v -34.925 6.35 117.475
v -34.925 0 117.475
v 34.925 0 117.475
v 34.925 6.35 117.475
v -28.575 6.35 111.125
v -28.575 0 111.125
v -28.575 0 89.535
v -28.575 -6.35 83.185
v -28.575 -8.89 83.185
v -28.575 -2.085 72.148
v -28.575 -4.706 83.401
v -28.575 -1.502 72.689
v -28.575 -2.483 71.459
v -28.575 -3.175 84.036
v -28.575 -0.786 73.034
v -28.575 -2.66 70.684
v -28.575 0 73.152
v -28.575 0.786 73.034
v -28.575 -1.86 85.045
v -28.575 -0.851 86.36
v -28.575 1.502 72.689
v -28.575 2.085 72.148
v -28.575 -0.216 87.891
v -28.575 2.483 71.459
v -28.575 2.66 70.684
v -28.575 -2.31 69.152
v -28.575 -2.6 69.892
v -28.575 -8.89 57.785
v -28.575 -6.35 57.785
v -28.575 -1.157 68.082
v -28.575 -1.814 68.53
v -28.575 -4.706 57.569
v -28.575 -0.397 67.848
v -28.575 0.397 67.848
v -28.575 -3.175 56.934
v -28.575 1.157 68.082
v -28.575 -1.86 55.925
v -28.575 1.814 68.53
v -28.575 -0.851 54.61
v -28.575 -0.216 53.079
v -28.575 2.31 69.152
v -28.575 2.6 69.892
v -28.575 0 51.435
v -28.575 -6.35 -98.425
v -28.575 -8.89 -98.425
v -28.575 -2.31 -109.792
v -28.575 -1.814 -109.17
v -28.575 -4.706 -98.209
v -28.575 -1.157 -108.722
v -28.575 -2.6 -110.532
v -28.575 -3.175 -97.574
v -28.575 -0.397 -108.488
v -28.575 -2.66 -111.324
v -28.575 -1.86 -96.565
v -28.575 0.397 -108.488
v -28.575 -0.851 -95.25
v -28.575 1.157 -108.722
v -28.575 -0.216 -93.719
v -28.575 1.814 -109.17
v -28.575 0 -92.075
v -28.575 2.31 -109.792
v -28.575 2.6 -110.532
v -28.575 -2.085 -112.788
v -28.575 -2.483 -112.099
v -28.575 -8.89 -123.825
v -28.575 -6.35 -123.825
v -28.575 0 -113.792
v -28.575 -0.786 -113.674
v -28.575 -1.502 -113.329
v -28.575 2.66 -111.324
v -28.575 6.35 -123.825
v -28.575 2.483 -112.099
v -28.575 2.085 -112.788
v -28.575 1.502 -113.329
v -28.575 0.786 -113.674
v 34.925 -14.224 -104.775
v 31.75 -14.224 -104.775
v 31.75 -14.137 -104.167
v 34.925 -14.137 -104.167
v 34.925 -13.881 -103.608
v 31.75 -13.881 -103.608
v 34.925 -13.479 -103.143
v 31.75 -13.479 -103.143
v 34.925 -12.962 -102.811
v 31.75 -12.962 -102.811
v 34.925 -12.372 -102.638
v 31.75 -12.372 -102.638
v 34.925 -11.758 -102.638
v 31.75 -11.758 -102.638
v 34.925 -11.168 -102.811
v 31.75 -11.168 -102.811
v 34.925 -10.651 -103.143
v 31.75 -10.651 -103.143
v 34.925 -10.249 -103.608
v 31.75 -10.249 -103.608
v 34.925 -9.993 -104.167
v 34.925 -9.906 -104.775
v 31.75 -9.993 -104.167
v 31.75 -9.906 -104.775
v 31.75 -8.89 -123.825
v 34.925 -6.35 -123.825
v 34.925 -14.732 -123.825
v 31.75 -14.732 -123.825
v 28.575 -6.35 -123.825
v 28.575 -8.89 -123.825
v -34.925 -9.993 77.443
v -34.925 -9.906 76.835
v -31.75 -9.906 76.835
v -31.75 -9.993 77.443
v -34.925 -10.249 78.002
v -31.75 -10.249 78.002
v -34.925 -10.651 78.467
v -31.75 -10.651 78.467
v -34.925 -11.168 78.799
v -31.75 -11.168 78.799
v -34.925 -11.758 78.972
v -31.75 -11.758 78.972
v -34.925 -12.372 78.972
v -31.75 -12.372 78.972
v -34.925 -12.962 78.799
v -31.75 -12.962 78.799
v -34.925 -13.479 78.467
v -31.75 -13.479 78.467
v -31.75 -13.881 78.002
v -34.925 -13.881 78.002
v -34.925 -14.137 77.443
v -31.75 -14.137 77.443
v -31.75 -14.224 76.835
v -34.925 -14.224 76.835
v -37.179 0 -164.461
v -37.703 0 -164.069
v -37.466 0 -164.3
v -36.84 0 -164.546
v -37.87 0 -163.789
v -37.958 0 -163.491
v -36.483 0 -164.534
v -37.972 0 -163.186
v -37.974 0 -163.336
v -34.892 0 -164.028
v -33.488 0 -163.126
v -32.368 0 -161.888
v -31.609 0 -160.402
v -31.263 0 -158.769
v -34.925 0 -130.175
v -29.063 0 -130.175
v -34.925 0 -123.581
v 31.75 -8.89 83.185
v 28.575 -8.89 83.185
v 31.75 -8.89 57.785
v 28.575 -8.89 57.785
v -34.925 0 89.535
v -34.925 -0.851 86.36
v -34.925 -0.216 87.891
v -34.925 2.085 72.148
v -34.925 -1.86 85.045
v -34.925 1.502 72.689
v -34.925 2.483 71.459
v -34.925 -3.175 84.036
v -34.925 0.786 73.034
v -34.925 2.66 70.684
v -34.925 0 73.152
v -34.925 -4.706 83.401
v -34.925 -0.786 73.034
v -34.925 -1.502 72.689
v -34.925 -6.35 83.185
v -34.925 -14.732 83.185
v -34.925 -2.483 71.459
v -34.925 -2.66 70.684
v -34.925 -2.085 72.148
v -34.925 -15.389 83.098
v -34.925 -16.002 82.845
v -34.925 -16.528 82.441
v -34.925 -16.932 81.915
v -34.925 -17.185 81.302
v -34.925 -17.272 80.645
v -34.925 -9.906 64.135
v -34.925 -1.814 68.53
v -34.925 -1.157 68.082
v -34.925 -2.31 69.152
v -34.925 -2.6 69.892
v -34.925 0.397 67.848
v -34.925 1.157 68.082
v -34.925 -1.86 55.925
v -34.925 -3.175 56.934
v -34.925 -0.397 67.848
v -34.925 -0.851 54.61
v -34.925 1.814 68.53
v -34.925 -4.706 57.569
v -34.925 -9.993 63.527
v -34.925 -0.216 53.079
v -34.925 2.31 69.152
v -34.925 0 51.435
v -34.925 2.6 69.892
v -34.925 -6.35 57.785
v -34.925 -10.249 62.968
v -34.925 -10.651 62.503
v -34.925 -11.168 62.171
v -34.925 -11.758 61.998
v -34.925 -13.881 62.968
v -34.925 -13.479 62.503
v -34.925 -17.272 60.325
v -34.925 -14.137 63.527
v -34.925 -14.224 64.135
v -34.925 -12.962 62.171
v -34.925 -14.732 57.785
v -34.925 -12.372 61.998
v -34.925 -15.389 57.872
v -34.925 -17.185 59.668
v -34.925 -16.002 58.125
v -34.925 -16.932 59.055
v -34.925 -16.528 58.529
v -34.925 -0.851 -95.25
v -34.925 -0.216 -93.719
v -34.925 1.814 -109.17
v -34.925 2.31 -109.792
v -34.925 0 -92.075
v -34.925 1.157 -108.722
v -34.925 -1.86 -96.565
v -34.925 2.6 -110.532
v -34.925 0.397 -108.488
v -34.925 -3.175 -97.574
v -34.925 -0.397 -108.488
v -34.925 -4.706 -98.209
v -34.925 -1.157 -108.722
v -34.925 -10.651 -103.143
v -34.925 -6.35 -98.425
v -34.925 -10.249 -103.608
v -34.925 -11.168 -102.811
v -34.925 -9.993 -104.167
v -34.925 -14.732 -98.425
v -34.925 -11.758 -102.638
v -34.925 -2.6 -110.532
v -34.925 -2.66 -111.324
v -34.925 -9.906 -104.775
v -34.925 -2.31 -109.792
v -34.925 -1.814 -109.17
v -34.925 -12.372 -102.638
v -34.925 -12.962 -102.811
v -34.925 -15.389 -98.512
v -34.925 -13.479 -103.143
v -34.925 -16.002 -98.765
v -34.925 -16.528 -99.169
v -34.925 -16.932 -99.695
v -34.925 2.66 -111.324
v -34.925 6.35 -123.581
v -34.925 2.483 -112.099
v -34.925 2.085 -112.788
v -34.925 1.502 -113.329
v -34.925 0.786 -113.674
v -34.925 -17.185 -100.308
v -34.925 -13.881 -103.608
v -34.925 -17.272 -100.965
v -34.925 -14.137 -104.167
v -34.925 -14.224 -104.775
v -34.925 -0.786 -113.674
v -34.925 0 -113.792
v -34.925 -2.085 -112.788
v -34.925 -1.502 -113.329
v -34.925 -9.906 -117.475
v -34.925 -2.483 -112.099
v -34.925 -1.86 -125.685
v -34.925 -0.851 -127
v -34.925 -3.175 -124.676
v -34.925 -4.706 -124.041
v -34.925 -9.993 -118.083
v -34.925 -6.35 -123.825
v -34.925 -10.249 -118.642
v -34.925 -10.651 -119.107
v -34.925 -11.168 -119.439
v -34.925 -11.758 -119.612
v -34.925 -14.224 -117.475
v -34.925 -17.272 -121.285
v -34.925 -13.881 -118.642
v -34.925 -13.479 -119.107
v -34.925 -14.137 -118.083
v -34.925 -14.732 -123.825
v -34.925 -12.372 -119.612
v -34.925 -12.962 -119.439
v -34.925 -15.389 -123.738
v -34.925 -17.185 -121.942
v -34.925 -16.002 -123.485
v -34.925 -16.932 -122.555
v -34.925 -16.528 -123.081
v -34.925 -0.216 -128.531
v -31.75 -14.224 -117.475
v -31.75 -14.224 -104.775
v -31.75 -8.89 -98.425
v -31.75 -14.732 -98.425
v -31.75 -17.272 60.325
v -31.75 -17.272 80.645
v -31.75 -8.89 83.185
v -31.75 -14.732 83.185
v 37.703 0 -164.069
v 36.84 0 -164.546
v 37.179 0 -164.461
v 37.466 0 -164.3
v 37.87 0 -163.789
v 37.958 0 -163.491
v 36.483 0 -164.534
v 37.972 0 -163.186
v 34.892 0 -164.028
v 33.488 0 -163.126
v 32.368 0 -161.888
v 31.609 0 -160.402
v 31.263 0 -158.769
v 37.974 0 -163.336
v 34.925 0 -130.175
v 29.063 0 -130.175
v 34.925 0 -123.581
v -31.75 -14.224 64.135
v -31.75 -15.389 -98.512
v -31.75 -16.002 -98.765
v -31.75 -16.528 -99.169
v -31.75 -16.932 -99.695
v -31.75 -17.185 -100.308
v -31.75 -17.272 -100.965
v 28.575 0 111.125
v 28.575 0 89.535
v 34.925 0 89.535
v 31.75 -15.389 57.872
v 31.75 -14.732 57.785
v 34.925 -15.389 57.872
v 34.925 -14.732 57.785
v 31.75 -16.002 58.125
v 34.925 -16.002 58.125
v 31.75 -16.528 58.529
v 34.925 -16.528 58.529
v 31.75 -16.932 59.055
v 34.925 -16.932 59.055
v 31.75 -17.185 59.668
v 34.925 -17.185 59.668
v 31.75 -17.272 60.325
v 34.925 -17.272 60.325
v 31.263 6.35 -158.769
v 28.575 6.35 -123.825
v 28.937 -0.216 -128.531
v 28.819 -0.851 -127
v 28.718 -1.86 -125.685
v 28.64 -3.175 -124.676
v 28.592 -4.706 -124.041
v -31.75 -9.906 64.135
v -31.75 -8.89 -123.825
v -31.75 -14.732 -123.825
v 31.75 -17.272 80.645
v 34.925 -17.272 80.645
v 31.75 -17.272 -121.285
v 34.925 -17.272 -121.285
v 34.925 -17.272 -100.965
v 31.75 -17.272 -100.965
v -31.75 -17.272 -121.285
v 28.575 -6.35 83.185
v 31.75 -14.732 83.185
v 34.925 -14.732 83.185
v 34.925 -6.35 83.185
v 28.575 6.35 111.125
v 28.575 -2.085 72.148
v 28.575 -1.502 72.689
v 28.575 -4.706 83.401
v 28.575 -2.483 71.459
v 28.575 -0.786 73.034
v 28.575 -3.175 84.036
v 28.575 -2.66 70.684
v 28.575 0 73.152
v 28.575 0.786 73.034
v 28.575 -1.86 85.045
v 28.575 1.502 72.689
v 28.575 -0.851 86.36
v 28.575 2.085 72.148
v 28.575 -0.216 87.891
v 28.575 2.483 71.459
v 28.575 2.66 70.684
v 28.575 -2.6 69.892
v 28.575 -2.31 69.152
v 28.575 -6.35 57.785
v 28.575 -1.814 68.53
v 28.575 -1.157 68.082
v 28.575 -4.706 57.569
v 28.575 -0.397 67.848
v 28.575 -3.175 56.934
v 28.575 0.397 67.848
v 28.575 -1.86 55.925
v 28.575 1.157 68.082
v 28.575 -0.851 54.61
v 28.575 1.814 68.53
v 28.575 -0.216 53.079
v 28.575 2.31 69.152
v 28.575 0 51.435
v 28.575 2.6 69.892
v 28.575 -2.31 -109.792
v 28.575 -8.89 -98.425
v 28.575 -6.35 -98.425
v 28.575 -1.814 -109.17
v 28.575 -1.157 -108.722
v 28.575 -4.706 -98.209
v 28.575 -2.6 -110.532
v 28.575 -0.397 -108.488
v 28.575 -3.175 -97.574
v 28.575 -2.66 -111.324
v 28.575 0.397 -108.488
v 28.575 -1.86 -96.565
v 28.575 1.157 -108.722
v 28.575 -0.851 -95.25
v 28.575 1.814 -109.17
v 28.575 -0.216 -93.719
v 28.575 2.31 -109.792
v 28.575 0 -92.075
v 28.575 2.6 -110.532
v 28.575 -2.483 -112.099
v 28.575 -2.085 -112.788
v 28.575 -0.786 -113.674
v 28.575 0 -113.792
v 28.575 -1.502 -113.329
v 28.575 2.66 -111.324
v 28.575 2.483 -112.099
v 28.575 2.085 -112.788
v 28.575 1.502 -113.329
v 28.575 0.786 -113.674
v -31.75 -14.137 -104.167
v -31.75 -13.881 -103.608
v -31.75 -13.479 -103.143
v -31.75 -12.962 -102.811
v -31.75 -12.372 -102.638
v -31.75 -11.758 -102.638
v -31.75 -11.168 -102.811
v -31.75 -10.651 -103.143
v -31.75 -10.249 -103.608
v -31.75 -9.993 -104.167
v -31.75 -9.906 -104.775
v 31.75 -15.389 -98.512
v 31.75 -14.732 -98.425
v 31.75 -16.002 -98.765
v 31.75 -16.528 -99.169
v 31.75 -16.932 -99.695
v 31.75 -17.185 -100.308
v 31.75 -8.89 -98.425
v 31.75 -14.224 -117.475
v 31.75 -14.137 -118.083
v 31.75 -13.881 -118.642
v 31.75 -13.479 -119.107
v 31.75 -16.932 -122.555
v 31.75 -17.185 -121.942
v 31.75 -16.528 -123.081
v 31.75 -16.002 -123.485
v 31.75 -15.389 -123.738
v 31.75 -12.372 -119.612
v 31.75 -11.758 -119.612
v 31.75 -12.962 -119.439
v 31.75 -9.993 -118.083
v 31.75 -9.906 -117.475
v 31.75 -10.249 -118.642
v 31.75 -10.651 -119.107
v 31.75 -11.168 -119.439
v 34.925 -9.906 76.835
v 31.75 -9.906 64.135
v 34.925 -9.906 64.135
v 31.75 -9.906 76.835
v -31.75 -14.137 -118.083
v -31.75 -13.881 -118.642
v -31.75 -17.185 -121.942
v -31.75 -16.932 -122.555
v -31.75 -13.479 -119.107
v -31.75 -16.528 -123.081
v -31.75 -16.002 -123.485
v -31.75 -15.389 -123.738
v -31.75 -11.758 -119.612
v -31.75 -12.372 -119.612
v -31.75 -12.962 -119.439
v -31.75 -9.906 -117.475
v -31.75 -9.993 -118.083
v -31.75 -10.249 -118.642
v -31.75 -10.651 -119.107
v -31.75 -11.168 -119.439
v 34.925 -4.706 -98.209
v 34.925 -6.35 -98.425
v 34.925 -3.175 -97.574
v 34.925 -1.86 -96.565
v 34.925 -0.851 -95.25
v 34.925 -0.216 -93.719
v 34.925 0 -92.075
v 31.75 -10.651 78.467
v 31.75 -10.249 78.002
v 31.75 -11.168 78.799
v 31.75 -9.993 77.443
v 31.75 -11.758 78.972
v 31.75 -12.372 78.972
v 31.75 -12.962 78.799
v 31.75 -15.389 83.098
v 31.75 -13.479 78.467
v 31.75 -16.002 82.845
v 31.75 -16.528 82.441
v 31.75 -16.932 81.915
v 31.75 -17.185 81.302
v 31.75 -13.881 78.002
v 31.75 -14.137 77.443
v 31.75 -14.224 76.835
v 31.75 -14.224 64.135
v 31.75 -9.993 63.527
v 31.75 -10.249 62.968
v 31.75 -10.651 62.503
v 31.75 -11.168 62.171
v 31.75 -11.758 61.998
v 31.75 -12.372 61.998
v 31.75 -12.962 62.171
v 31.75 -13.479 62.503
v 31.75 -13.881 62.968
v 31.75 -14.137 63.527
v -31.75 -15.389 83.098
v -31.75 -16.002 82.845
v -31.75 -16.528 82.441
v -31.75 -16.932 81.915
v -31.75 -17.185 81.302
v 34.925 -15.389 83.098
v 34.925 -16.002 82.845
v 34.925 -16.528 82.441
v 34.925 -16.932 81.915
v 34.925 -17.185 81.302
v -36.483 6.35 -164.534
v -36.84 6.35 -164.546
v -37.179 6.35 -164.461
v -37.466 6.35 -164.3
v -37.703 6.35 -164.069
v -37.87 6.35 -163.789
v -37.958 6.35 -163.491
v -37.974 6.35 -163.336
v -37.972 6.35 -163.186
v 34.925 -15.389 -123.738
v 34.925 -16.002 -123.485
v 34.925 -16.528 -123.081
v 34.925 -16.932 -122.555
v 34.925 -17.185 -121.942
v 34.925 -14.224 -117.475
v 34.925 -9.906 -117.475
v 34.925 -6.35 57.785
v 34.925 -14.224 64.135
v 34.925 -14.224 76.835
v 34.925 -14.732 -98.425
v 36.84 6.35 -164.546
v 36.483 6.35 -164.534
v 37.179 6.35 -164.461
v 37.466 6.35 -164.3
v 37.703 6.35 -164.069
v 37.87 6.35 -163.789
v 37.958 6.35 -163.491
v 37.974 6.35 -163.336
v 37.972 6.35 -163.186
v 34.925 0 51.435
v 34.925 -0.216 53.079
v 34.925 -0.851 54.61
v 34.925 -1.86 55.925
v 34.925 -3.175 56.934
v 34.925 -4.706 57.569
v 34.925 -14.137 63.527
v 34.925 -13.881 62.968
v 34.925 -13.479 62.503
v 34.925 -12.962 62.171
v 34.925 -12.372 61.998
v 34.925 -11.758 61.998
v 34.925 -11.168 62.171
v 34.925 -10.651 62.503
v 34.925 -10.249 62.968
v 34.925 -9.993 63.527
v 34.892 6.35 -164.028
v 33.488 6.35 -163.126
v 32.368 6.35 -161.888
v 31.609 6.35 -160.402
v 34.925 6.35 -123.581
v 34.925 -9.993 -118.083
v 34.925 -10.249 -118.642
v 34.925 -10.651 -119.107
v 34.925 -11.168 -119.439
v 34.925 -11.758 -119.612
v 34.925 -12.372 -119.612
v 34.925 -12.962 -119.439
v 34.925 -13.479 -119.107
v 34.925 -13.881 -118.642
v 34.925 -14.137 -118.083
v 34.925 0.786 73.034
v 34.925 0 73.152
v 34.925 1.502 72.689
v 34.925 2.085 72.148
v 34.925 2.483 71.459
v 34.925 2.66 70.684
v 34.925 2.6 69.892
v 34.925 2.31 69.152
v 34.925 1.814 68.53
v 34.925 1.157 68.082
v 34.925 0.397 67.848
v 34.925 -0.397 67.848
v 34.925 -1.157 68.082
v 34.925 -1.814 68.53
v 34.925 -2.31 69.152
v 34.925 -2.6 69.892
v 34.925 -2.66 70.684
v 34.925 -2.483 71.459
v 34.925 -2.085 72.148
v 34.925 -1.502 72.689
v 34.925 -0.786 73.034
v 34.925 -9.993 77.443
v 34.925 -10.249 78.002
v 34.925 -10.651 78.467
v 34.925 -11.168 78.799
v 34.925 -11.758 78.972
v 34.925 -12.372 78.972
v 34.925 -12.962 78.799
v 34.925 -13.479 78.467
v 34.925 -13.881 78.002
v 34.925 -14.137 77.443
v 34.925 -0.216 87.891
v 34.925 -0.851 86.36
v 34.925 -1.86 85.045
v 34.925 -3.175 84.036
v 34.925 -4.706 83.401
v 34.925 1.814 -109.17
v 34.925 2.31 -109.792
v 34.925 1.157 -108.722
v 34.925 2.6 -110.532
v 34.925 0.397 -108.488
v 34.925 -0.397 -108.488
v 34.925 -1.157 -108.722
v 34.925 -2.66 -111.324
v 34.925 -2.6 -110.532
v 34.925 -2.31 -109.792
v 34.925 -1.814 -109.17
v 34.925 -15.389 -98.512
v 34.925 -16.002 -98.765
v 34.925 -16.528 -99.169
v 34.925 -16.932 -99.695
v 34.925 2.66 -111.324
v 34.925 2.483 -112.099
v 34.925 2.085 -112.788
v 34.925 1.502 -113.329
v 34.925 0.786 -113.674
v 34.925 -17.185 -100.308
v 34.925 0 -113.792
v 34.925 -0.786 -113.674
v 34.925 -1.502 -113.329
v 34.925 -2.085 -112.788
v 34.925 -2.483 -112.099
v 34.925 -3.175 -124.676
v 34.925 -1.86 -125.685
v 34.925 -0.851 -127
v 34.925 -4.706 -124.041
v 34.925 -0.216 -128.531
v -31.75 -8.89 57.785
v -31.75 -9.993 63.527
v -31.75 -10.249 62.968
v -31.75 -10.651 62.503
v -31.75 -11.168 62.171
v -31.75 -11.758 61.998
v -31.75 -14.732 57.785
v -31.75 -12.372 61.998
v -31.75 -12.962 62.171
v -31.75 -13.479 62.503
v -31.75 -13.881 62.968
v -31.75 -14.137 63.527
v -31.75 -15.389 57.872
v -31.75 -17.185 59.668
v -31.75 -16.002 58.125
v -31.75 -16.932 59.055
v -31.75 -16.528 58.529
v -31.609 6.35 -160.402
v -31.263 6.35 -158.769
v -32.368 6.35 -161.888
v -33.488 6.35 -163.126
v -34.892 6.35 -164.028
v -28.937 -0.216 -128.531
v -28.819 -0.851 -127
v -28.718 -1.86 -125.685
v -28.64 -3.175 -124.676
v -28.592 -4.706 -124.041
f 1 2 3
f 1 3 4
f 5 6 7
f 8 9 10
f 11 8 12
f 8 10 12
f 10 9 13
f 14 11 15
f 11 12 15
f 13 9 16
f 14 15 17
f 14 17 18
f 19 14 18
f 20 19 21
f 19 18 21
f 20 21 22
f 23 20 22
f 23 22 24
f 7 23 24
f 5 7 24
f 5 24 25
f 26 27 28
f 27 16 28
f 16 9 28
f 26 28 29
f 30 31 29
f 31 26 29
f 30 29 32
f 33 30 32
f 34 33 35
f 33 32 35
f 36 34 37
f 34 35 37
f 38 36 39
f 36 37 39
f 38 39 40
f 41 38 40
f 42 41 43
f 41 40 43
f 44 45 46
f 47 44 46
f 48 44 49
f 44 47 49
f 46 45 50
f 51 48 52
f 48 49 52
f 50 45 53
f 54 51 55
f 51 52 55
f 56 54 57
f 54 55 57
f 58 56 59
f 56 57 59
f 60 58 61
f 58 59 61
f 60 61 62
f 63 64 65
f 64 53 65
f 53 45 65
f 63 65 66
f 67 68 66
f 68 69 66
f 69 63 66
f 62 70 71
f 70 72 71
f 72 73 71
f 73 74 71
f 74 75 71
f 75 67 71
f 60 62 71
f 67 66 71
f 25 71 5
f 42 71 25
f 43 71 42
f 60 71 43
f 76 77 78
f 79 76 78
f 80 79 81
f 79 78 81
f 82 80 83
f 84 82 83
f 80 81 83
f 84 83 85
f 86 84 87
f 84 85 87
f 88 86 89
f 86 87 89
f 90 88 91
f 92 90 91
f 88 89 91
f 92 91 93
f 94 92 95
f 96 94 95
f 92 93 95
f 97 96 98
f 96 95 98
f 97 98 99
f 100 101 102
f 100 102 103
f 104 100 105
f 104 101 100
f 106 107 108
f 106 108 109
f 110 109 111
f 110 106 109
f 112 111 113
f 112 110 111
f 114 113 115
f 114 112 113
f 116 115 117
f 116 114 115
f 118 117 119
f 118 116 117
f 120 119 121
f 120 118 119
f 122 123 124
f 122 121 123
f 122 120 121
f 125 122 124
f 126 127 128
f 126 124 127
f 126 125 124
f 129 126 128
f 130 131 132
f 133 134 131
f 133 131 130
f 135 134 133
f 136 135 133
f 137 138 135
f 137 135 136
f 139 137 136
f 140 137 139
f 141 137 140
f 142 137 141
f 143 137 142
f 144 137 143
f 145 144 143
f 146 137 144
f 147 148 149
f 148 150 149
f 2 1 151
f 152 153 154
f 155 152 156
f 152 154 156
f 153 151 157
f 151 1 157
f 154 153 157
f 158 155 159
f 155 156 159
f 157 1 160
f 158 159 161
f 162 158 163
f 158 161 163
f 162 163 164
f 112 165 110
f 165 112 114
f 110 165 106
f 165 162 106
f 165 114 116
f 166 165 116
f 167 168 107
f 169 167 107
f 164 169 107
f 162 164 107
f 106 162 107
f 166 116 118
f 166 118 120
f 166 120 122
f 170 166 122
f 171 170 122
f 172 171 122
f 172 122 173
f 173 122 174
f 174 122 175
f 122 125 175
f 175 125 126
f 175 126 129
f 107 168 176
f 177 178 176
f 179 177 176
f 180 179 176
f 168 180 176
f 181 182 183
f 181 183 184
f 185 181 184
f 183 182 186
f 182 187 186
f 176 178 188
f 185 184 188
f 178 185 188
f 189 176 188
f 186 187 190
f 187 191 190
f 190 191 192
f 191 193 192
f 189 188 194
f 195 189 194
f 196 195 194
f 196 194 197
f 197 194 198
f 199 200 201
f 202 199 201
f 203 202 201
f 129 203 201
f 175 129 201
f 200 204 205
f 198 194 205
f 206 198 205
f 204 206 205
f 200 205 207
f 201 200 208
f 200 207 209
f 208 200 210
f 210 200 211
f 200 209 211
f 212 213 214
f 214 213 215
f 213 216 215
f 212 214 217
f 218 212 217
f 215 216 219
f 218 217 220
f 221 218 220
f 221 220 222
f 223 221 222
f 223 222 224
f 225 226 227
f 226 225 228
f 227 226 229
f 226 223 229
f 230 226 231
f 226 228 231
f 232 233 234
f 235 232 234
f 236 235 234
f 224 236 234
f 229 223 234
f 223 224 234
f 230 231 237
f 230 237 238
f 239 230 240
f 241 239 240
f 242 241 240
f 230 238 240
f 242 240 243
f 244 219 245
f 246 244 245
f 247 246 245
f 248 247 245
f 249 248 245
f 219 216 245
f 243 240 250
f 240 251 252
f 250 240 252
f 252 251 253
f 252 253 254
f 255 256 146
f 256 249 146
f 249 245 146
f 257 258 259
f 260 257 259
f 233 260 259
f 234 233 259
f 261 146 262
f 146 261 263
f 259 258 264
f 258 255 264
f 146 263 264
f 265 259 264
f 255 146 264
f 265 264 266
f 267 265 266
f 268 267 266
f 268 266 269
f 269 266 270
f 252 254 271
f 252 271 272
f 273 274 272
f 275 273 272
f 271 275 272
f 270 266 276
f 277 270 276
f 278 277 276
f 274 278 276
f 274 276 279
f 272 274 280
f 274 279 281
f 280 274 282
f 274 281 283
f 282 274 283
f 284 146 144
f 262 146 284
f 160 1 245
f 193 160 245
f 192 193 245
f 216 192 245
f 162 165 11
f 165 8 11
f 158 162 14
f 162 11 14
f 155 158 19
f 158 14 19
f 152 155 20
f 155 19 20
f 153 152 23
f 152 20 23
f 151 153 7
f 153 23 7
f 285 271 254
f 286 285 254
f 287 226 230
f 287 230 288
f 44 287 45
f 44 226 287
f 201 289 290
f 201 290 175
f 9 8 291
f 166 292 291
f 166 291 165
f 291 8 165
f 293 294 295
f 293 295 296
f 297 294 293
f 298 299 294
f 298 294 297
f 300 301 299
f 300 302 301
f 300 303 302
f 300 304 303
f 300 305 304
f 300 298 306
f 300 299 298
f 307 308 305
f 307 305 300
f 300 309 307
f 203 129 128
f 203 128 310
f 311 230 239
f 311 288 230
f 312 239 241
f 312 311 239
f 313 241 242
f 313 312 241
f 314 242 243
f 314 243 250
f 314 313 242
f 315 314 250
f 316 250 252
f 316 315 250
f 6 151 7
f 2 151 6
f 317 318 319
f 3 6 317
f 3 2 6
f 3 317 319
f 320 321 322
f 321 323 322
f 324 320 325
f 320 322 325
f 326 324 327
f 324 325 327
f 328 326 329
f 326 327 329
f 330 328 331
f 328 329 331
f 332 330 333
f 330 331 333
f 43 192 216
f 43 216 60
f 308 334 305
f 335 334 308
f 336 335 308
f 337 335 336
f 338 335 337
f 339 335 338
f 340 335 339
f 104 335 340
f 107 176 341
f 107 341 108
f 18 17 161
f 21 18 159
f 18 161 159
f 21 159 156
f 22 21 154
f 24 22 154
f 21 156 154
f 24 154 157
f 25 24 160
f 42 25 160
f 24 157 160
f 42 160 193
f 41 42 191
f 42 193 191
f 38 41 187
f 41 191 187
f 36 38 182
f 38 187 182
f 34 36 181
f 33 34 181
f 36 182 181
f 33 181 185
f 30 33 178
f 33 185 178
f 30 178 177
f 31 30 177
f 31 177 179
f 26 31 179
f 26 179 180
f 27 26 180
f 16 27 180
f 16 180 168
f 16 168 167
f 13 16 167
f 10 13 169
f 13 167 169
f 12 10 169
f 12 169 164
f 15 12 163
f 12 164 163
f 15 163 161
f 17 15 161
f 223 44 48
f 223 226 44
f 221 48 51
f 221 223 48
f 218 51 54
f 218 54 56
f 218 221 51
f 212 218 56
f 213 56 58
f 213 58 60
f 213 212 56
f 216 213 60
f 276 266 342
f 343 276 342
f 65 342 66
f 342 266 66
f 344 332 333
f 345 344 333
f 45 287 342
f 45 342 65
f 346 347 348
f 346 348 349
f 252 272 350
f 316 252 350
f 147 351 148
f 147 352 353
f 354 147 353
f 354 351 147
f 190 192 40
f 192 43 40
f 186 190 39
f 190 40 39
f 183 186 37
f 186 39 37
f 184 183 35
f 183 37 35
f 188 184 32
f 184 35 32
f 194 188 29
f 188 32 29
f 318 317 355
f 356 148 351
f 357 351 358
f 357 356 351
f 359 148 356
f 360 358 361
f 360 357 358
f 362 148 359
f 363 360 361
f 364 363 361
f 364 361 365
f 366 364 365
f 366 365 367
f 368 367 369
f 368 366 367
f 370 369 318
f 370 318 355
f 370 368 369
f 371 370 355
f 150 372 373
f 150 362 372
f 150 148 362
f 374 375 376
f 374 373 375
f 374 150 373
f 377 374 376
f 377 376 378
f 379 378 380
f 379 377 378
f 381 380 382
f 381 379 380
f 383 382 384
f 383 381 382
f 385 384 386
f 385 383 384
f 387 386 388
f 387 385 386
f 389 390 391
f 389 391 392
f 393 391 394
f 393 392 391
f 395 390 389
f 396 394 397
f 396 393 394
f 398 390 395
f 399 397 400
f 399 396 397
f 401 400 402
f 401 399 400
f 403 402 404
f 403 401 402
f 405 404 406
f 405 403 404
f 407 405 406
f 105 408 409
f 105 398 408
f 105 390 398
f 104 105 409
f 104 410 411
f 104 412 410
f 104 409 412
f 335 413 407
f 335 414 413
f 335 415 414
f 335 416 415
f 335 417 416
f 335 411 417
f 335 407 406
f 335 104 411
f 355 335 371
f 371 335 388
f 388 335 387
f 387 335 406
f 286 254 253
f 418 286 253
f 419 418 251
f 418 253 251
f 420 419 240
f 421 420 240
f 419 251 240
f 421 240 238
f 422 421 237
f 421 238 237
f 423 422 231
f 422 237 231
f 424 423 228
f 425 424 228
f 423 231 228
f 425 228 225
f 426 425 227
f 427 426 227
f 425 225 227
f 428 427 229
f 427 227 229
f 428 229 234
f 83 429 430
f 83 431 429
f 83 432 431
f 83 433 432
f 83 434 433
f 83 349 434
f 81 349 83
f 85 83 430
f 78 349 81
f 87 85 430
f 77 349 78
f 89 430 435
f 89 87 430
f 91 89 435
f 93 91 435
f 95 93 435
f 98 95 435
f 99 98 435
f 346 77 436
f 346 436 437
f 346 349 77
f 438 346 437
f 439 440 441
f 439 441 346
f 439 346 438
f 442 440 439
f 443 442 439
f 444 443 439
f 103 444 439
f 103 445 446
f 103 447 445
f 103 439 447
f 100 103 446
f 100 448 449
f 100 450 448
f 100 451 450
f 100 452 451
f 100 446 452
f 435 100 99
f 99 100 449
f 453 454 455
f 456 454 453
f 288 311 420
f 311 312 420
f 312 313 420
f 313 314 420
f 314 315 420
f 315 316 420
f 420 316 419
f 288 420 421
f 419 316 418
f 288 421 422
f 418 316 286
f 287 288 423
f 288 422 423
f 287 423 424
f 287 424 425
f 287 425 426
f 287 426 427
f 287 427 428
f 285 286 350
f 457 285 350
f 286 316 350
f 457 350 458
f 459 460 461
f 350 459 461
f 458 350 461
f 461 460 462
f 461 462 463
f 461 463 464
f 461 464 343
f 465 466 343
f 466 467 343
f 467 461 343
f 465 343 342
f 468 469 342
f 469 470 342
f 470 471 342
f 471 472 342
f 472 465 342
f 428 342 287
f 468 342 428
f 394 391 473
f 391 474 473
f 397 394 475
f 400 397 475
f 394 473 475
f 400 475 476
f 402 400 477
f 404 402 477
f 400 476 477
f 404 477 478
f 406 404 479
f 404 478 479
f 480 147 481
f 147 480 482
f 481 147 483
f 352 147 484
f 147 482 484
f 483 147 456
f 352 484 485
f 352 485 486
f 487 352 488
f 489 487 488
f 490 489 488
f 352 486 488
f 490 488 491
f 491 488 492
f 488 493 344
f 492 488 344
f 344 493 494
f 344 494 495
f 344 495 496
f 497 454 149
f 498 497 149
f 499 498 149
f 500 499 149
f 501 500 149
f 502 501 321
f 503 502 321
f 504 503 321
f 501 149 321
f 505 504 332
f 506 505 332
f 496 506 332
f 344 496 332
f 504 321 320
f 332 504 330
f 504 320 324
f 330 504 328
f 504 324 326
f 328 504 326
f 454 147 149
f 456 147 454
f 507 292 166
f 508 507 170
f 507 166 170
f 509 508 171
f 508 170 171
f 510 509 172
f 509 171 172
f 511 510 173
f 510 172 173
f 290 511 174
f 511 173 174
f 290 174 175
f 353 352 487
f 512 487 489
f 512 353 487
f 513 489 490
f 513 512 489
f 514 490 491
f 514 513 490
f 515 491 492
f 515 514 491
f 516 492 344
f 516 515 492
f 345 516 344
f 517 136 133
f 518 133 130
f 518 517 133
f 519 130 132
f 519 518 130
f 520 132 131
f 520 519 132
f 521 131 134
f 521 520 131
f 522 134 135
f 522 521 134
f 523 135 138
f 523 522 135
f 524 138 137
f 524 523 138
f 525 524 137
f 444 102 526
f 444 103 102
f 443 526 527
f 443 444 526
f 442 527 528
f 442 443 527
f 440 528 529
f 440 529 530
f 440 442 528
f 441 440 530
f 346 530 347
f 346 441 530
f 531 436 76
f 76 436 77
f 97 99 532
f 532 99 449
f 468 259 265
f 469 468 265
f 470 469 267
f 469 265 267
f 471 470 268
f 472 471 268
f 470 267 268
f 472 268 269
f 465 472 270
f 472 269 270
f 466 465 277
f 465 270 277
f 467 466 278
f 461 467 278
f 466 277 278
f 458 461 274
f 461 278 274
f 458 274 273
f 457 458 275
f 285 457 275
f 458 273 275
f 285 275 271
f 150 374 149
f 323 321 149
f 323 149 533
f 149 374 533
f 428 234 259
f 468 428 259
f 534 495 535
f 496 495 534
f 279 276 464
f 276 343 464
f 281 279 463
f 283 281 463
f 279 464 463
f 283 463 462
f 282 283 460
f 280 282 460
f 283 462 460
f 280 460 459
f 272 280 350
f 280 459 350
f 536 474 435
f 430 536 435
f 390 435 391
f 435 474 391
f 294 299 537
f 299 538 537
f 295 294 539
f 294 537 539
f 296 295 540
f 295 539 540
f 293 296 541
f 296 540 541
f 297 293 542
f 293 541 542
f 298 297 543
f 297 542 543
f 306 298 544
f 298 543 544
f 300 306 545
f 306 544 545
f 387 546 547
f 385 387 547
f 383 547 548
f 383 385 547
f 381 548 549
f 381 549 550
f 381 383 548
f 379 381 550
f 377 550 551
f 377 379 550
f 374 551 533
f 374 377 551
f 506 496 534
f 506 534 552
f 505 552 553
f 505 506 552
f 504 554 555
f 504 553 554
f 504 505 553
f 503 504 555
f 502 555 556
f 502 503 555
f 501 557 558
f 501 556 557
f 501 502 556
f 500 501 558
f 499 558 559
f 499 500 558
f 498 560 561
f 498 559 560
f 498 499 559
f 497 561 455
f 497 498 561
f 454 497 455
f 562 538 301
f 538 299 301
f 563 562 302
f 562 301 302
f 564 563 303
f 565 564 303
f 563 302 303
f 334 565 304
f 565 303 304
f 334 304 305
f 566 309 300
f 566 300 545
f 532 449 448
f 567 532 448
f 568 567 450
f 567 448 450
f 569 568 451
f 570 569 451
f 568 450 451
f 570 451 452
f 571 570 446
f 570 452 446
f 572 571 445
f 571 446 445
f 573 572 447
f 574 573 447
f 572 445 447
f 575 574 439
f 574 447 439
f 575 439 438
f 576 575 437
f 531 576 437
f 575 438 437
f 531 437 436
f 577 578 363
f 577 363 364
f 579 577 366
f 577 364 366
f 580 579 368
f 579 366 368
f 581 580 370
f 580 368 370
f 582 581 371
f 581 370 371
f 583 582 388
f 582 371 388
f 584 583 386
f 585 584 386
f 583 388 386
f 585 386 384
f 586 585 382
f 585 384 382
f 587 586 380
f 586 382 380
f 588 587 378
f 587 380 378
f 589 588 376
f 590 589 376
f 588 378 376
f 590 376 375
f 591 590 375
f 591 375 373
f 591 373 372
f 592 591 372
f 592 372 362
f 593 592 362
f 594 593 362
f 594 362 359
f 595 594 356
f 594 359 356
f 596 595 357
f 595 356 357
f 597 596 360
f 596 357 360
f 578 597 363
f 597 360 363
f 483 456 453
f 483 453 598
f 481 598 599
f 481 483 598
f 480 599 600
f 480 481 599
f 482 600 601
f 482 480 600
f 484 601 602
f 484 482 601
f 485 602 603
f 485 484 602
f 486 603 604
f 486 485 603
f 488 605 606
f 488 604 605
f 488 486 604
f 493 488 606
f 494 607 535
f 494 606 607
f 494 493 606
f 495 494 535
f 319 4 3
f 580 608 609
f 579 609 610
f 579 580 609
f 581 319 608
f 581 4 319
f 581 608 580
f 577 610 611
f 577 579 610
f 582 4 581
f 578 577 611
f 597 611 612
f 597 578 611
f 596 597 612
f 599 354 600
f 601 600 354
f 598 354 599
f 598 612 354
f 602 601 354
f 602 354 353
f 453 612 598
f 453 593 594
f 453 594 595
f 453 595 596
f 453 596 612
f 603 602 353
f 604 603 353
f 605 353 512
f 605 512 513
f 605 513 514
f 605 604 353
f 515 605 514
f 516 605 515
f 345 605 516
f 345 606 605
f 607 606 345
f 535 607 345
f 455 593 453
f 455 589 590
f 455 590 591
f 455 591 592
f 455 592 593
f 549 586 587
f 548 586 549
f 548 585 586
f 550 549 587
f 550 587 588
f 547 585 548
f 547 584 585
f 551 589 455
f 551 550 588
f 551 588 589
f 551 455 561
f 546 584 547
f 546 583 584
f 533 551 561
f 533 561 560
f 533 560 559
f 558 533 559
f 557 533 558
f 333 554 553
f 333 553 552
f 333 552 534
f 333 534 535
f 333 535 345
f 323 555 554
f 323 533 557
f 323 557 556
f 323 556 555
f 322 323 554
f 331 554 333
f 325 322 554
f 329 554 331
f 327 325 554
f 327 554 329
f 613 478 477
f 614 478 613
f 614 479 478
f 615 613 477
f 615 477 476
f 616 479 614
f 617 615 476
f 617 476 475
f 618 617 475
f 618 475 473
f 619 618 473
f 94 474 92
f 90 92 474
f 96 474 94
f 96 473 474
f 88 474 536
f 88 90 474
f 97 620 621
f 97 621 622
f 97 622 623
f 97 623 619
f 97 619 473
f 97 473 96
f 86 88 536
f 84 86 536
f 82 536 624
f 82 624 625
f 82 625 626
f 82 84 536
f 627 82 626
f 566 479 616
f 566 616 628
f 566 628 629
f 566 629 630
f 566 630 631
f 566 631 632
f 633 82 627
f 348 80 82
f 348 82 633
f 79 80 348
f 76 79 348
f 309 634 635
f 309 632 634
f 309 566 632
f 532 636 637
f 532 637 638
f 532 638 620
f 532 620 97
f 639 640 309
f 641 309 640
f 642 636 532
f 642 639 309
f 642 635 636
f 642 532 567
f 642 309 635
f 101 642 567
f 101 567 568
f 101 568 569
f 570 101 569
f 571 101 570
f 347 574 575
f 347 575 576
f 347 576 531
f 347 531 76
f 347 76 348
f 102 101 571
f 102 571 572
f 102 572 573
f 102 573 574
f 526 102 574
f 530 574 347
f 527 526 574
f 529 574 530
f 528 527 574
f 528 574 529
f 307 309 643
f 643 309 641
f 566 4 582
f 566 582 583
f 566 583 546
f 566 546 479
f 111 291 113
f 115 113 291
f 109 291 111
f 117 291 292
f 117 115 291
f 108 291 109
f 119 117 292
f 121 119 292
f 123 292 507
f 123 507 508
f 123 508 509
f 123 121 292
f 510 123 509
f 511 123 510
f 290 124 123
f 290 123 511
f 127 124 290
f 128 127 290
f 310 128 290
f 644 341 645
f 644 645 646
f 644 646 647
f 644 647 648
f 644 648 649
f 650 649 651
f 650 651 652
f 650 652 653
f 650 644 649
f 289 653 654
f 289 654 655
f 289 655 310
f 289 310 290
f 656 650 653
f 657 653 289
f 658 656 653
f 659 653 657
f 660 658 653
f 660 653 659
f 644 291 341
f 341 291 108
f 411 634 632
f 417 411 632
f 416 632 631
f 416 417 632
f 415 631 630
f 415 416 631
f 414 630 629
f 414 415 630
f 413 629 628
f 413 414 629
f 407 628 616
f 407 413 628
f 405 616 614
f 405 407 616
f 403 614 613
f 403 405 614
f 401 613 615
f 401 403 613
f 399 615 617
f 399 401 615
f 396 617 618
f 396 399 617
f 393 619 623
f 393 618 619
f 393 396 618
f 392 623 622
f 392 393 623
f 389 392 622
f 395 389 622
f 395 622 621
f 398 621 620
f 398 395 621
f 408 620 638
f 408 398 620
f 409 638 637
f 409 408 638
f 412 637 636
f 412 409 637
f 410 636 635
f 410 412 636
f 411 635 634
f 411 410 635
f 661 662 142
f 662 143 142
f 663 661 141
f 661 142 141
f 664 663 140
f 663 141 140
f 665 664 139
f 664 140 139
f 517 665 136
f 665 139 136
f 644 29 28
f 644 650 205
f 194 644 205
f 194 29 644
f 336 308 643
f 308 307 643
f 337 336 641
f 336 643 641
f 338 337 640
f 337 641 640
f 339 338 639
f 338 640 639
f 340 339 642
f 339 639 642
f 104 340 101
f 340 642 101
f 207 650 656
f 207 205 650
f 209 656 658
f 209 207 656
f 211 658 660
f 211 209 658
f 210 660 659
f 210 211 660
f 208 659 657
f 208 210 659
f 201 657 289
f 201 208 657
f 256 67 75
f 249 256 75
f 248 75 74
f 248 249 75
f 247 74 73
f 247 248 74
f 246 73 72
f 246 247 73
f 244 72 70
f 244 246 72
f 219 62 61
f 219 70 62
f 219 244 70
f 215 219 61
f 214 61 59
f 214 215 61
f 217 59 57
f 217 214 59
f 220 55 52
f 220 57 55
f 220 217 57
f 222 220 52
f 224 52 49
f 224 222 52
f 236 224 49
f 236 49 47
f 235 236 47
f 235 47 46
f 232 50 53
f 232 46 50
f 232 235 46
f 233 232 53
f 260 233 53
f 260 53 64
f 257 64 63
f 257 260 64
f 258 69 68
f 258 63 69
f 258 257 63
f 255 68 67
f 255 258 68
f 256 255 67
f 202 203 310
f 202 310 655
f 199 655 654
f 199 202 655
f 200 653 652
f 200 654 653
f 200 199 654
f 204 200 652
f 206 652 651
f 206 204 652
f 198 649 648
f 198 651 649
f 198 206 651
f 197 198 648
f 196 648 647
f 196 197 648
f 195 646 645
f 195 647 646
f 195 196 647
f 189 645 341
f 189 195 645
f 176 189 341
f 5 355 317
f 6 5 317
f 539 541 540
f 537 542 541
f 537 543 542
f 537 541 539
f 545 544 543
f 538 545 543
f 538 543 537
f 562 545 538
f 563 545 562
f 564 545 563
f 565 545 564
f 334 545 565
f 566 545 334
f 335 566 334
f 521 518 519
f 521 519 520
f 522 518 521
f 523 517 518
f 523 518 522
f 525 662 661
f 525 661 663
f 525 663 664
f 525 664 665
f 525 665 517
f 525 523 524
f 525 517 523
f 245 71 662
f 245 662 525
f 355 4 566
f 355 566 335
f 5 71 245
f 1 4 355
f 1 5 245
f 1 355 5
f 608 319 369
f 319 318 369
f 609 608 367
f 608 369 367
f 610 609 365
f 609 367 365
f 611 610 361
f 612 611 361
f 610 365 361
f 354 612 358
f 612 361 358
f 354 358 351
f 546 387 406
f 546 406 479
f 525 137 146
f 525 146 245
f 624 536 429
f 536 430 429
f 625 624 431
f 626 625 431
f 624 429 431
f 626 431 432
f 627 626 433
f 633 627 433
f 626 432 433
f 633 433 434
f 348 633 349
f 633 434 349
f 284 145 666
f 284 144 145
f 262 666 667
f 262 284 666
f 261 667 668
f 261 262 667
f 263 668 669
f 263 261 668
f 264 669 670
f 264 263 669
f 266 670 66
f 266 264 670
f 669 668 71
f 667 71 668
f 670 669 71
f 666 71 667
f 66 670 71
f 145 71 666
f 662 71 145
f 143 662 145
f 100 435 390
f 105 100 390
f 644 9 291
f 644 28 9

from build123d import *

# Parameters (mm, degrees)
RAIL_PROFILE_W     = 6.35
RAIL_PROFILE_H     = 6.35
BACKCLIP_DEPTH     = 12.7
FRONTCLIP_DEPTH    = 12.7
SKETCH8_R          = 2.667
CUT_EXTRUDE1_DEPTH = 179.88374375
FILLET1_R          = 2.54
CUT_EXTRUDE3_DEPTH = 181.090926708
FILLET3_R          = 6.35
FILLET5_R          = 1.27
FILLET10_R         = 6.35


with BuildPart() as part:
    # Sweep1: sweep along a path in rail_path
    with BuildLine(Plane(origin=(0, 0, 0), x_dir=(1, 0, 0), z_dir=(0, 1, 0))) as sweep1_path:
        Line((31.75, 165.1), (28.575, 123.825))
        Line((28.575, 123.825), (28.575, 111.125))
        Line((28.575, 111.125), (28.575, -111.125))
        Line((28.575, -111.125), (-28.575, -111.125))
        Line((-28.575, -111.125), (-28.575, 111.125))
        Line((-28.575, 111.125), (-28.575, 123.825))
        Line((-28.575, 123.825), (-31.75, 165.1))
    # rail_profile → Sweep1 (sweep)
    with BuildSketch(Plane.XY):
        with Locations((31.75, 3.175)):
            Rectangle(RAIL_PROFILE_W, RAIL_PROFILE_H)
    sweep(path=sweep1_path.line, transition=Transition.RIGHT)

    # BackClipProfile → BackClip (add, symmetric)
    with BuildSketch(Plane(origin=(0, 0, 70.485), x_dir=(-1, 0, 0), z_dir=(0, 0, -1))):
        Polygon((-34.925, -8.89), (-34.925, 0), (-28.575, 0), (-28.575, -8.89), (-31.75, -8.89), (-31.75, -17.272), (-34.925, -17.272), align=None)
    backclip = extrude(amount=BACKCLIP_DEPTH, both=True)

    # BackClipMirror: BackClip across plane
    add(backclip.mirror(Plane(origin=(0, 0, 0), x_dir=(0, 0, 1), z_dir=(1, 0, 0))))

    # FrontClipProfile → FrontClip (add, symmetric)
    with BuildSketch(Plane(origin=(0, 0, -111.125), x_dir=(-1, 0, 0), z_dir=(0, 0, -1))):
        Polygon((-31.75, -17.272), (-31.75, -8.89), (-28.575, -8.89), (-28.575, 0), (-34.925, 0), (-34.925, -8.89), (-34.925, -17.272), align=None)
    frontclip = extrude(amount=FRONTCLIP_DEPTH, both=True)

    # FrontClipMirror: FrontClip across plane
    add(frontclip.mirror(Plane(origin=(0, 0, 0), x_dir=(0, 0, 1), z_dir=(1, 0, 0))))

    # Sketch8 → Cut-Extrude1 (cut, symmetric)
    with BuildSketch(Plane.ZY.offset(-28.575)):
        with Locations((70.485, 0)):
            Circle(SKETCH8_R)
    cut_extrude1 = extrude(amount=CUT_EXTRUDE1_DEPTH, both=True, mode=Mode.SUBTRACT)

    # Fillet1
    fillet1_edges = [part.edges().sort_by_distance(p)[0] for p in [
        (33.3375, -17.272, -98.425),
        (33.3375, -17.272, -123.825),
        (-33.3375, -17.272, -123.825),
        (-33.3375, -17.272, -98.425),
        (33.3375, -17.272, 83.185),
        (33.3375, -17.272, 57.785),
        (-33.3375, -17.272, 57.785),
        (-33.3375, -17.272, 83.185),
    ]]
    fillet(fillet1_edges, radius=FILLET1_R)

    # Mirror2: Cut-Extrude1 across plane
    add(cut_extrude1.mirror(Plane(origin=(0, 0, -20.32), x_dir=(1, 0, 0), z_dir=(0, 0, -1))), mode=Mode.SUBTRACT)

    # Sketch10 → Cut-Extrude3 (cut, symmetric)
    with BuildSketch(Plane.ZY.offset(-31.75)):
        with BuildLine():
            Line((64.135, -9.906), (76.835, -9.906))
            ThreePointArc((76.835, -9.906), (78.994, -12.065), (76.835, -14.224))
            Line((76.835, -14.224), (64.135, -14.224))
            ThreePointArc((64.135, -14.224), (61.976, -12.065), (64.135, -9.906))
        make_face()
    cut_extrude3 = extrude(amount=CUT_EXTRUDE3_DEPTH, both=True, mode=Mode.SUBTRACT)

    # Mirror3: Cut-Extrude3 across plane
    add(cut_extrude3.mirror(Plane(origin=(0, 0, -20.32), x_dir=(1, 0, 0), z_dir=(0, 0, -1))), mode=Mode.SUBTRACT)

    # Fillet3
    fillet3_edges = [part.edges().sort_by_distance(p)[0] for p in [
        (31.75, 3.175, -165.1),
        (-31.75, 3.175, -165.1),
    ]]
    fillet(fillet3_edges, radius=FILLET3_R - 0.0001)  # a hair under: the kernel refuses the full size

    # Fillet5
    fillet5_edges = [part.edges().sort_by_distance(p)[0] for p in [
        (-38.081295983, 3.175, -164.612977232),
        (38.081295983, 3.175, -164.612977232),
    ]]
    fillet(fillet5_edges, radius=FILLET5_R)

    # Fillet10
    fillet10_edges = [part.edges().sort_by_distance(p)[0] for p in [
        (31.75, 0, -98.425),
        (31.75, 0, -123.825),
        (-31.75, 0, -123.825),
        (-31.75, 0, -98.425),
        (31.75, 0, 83.185),
        (31.75, 0, 57.785),
        (-31.75, 0, 57.785),
        (-31.75, 0, 83.185),
    ]]
    fillet(fillet10_edges, radius=FILLET10_R)


solid = part.part
